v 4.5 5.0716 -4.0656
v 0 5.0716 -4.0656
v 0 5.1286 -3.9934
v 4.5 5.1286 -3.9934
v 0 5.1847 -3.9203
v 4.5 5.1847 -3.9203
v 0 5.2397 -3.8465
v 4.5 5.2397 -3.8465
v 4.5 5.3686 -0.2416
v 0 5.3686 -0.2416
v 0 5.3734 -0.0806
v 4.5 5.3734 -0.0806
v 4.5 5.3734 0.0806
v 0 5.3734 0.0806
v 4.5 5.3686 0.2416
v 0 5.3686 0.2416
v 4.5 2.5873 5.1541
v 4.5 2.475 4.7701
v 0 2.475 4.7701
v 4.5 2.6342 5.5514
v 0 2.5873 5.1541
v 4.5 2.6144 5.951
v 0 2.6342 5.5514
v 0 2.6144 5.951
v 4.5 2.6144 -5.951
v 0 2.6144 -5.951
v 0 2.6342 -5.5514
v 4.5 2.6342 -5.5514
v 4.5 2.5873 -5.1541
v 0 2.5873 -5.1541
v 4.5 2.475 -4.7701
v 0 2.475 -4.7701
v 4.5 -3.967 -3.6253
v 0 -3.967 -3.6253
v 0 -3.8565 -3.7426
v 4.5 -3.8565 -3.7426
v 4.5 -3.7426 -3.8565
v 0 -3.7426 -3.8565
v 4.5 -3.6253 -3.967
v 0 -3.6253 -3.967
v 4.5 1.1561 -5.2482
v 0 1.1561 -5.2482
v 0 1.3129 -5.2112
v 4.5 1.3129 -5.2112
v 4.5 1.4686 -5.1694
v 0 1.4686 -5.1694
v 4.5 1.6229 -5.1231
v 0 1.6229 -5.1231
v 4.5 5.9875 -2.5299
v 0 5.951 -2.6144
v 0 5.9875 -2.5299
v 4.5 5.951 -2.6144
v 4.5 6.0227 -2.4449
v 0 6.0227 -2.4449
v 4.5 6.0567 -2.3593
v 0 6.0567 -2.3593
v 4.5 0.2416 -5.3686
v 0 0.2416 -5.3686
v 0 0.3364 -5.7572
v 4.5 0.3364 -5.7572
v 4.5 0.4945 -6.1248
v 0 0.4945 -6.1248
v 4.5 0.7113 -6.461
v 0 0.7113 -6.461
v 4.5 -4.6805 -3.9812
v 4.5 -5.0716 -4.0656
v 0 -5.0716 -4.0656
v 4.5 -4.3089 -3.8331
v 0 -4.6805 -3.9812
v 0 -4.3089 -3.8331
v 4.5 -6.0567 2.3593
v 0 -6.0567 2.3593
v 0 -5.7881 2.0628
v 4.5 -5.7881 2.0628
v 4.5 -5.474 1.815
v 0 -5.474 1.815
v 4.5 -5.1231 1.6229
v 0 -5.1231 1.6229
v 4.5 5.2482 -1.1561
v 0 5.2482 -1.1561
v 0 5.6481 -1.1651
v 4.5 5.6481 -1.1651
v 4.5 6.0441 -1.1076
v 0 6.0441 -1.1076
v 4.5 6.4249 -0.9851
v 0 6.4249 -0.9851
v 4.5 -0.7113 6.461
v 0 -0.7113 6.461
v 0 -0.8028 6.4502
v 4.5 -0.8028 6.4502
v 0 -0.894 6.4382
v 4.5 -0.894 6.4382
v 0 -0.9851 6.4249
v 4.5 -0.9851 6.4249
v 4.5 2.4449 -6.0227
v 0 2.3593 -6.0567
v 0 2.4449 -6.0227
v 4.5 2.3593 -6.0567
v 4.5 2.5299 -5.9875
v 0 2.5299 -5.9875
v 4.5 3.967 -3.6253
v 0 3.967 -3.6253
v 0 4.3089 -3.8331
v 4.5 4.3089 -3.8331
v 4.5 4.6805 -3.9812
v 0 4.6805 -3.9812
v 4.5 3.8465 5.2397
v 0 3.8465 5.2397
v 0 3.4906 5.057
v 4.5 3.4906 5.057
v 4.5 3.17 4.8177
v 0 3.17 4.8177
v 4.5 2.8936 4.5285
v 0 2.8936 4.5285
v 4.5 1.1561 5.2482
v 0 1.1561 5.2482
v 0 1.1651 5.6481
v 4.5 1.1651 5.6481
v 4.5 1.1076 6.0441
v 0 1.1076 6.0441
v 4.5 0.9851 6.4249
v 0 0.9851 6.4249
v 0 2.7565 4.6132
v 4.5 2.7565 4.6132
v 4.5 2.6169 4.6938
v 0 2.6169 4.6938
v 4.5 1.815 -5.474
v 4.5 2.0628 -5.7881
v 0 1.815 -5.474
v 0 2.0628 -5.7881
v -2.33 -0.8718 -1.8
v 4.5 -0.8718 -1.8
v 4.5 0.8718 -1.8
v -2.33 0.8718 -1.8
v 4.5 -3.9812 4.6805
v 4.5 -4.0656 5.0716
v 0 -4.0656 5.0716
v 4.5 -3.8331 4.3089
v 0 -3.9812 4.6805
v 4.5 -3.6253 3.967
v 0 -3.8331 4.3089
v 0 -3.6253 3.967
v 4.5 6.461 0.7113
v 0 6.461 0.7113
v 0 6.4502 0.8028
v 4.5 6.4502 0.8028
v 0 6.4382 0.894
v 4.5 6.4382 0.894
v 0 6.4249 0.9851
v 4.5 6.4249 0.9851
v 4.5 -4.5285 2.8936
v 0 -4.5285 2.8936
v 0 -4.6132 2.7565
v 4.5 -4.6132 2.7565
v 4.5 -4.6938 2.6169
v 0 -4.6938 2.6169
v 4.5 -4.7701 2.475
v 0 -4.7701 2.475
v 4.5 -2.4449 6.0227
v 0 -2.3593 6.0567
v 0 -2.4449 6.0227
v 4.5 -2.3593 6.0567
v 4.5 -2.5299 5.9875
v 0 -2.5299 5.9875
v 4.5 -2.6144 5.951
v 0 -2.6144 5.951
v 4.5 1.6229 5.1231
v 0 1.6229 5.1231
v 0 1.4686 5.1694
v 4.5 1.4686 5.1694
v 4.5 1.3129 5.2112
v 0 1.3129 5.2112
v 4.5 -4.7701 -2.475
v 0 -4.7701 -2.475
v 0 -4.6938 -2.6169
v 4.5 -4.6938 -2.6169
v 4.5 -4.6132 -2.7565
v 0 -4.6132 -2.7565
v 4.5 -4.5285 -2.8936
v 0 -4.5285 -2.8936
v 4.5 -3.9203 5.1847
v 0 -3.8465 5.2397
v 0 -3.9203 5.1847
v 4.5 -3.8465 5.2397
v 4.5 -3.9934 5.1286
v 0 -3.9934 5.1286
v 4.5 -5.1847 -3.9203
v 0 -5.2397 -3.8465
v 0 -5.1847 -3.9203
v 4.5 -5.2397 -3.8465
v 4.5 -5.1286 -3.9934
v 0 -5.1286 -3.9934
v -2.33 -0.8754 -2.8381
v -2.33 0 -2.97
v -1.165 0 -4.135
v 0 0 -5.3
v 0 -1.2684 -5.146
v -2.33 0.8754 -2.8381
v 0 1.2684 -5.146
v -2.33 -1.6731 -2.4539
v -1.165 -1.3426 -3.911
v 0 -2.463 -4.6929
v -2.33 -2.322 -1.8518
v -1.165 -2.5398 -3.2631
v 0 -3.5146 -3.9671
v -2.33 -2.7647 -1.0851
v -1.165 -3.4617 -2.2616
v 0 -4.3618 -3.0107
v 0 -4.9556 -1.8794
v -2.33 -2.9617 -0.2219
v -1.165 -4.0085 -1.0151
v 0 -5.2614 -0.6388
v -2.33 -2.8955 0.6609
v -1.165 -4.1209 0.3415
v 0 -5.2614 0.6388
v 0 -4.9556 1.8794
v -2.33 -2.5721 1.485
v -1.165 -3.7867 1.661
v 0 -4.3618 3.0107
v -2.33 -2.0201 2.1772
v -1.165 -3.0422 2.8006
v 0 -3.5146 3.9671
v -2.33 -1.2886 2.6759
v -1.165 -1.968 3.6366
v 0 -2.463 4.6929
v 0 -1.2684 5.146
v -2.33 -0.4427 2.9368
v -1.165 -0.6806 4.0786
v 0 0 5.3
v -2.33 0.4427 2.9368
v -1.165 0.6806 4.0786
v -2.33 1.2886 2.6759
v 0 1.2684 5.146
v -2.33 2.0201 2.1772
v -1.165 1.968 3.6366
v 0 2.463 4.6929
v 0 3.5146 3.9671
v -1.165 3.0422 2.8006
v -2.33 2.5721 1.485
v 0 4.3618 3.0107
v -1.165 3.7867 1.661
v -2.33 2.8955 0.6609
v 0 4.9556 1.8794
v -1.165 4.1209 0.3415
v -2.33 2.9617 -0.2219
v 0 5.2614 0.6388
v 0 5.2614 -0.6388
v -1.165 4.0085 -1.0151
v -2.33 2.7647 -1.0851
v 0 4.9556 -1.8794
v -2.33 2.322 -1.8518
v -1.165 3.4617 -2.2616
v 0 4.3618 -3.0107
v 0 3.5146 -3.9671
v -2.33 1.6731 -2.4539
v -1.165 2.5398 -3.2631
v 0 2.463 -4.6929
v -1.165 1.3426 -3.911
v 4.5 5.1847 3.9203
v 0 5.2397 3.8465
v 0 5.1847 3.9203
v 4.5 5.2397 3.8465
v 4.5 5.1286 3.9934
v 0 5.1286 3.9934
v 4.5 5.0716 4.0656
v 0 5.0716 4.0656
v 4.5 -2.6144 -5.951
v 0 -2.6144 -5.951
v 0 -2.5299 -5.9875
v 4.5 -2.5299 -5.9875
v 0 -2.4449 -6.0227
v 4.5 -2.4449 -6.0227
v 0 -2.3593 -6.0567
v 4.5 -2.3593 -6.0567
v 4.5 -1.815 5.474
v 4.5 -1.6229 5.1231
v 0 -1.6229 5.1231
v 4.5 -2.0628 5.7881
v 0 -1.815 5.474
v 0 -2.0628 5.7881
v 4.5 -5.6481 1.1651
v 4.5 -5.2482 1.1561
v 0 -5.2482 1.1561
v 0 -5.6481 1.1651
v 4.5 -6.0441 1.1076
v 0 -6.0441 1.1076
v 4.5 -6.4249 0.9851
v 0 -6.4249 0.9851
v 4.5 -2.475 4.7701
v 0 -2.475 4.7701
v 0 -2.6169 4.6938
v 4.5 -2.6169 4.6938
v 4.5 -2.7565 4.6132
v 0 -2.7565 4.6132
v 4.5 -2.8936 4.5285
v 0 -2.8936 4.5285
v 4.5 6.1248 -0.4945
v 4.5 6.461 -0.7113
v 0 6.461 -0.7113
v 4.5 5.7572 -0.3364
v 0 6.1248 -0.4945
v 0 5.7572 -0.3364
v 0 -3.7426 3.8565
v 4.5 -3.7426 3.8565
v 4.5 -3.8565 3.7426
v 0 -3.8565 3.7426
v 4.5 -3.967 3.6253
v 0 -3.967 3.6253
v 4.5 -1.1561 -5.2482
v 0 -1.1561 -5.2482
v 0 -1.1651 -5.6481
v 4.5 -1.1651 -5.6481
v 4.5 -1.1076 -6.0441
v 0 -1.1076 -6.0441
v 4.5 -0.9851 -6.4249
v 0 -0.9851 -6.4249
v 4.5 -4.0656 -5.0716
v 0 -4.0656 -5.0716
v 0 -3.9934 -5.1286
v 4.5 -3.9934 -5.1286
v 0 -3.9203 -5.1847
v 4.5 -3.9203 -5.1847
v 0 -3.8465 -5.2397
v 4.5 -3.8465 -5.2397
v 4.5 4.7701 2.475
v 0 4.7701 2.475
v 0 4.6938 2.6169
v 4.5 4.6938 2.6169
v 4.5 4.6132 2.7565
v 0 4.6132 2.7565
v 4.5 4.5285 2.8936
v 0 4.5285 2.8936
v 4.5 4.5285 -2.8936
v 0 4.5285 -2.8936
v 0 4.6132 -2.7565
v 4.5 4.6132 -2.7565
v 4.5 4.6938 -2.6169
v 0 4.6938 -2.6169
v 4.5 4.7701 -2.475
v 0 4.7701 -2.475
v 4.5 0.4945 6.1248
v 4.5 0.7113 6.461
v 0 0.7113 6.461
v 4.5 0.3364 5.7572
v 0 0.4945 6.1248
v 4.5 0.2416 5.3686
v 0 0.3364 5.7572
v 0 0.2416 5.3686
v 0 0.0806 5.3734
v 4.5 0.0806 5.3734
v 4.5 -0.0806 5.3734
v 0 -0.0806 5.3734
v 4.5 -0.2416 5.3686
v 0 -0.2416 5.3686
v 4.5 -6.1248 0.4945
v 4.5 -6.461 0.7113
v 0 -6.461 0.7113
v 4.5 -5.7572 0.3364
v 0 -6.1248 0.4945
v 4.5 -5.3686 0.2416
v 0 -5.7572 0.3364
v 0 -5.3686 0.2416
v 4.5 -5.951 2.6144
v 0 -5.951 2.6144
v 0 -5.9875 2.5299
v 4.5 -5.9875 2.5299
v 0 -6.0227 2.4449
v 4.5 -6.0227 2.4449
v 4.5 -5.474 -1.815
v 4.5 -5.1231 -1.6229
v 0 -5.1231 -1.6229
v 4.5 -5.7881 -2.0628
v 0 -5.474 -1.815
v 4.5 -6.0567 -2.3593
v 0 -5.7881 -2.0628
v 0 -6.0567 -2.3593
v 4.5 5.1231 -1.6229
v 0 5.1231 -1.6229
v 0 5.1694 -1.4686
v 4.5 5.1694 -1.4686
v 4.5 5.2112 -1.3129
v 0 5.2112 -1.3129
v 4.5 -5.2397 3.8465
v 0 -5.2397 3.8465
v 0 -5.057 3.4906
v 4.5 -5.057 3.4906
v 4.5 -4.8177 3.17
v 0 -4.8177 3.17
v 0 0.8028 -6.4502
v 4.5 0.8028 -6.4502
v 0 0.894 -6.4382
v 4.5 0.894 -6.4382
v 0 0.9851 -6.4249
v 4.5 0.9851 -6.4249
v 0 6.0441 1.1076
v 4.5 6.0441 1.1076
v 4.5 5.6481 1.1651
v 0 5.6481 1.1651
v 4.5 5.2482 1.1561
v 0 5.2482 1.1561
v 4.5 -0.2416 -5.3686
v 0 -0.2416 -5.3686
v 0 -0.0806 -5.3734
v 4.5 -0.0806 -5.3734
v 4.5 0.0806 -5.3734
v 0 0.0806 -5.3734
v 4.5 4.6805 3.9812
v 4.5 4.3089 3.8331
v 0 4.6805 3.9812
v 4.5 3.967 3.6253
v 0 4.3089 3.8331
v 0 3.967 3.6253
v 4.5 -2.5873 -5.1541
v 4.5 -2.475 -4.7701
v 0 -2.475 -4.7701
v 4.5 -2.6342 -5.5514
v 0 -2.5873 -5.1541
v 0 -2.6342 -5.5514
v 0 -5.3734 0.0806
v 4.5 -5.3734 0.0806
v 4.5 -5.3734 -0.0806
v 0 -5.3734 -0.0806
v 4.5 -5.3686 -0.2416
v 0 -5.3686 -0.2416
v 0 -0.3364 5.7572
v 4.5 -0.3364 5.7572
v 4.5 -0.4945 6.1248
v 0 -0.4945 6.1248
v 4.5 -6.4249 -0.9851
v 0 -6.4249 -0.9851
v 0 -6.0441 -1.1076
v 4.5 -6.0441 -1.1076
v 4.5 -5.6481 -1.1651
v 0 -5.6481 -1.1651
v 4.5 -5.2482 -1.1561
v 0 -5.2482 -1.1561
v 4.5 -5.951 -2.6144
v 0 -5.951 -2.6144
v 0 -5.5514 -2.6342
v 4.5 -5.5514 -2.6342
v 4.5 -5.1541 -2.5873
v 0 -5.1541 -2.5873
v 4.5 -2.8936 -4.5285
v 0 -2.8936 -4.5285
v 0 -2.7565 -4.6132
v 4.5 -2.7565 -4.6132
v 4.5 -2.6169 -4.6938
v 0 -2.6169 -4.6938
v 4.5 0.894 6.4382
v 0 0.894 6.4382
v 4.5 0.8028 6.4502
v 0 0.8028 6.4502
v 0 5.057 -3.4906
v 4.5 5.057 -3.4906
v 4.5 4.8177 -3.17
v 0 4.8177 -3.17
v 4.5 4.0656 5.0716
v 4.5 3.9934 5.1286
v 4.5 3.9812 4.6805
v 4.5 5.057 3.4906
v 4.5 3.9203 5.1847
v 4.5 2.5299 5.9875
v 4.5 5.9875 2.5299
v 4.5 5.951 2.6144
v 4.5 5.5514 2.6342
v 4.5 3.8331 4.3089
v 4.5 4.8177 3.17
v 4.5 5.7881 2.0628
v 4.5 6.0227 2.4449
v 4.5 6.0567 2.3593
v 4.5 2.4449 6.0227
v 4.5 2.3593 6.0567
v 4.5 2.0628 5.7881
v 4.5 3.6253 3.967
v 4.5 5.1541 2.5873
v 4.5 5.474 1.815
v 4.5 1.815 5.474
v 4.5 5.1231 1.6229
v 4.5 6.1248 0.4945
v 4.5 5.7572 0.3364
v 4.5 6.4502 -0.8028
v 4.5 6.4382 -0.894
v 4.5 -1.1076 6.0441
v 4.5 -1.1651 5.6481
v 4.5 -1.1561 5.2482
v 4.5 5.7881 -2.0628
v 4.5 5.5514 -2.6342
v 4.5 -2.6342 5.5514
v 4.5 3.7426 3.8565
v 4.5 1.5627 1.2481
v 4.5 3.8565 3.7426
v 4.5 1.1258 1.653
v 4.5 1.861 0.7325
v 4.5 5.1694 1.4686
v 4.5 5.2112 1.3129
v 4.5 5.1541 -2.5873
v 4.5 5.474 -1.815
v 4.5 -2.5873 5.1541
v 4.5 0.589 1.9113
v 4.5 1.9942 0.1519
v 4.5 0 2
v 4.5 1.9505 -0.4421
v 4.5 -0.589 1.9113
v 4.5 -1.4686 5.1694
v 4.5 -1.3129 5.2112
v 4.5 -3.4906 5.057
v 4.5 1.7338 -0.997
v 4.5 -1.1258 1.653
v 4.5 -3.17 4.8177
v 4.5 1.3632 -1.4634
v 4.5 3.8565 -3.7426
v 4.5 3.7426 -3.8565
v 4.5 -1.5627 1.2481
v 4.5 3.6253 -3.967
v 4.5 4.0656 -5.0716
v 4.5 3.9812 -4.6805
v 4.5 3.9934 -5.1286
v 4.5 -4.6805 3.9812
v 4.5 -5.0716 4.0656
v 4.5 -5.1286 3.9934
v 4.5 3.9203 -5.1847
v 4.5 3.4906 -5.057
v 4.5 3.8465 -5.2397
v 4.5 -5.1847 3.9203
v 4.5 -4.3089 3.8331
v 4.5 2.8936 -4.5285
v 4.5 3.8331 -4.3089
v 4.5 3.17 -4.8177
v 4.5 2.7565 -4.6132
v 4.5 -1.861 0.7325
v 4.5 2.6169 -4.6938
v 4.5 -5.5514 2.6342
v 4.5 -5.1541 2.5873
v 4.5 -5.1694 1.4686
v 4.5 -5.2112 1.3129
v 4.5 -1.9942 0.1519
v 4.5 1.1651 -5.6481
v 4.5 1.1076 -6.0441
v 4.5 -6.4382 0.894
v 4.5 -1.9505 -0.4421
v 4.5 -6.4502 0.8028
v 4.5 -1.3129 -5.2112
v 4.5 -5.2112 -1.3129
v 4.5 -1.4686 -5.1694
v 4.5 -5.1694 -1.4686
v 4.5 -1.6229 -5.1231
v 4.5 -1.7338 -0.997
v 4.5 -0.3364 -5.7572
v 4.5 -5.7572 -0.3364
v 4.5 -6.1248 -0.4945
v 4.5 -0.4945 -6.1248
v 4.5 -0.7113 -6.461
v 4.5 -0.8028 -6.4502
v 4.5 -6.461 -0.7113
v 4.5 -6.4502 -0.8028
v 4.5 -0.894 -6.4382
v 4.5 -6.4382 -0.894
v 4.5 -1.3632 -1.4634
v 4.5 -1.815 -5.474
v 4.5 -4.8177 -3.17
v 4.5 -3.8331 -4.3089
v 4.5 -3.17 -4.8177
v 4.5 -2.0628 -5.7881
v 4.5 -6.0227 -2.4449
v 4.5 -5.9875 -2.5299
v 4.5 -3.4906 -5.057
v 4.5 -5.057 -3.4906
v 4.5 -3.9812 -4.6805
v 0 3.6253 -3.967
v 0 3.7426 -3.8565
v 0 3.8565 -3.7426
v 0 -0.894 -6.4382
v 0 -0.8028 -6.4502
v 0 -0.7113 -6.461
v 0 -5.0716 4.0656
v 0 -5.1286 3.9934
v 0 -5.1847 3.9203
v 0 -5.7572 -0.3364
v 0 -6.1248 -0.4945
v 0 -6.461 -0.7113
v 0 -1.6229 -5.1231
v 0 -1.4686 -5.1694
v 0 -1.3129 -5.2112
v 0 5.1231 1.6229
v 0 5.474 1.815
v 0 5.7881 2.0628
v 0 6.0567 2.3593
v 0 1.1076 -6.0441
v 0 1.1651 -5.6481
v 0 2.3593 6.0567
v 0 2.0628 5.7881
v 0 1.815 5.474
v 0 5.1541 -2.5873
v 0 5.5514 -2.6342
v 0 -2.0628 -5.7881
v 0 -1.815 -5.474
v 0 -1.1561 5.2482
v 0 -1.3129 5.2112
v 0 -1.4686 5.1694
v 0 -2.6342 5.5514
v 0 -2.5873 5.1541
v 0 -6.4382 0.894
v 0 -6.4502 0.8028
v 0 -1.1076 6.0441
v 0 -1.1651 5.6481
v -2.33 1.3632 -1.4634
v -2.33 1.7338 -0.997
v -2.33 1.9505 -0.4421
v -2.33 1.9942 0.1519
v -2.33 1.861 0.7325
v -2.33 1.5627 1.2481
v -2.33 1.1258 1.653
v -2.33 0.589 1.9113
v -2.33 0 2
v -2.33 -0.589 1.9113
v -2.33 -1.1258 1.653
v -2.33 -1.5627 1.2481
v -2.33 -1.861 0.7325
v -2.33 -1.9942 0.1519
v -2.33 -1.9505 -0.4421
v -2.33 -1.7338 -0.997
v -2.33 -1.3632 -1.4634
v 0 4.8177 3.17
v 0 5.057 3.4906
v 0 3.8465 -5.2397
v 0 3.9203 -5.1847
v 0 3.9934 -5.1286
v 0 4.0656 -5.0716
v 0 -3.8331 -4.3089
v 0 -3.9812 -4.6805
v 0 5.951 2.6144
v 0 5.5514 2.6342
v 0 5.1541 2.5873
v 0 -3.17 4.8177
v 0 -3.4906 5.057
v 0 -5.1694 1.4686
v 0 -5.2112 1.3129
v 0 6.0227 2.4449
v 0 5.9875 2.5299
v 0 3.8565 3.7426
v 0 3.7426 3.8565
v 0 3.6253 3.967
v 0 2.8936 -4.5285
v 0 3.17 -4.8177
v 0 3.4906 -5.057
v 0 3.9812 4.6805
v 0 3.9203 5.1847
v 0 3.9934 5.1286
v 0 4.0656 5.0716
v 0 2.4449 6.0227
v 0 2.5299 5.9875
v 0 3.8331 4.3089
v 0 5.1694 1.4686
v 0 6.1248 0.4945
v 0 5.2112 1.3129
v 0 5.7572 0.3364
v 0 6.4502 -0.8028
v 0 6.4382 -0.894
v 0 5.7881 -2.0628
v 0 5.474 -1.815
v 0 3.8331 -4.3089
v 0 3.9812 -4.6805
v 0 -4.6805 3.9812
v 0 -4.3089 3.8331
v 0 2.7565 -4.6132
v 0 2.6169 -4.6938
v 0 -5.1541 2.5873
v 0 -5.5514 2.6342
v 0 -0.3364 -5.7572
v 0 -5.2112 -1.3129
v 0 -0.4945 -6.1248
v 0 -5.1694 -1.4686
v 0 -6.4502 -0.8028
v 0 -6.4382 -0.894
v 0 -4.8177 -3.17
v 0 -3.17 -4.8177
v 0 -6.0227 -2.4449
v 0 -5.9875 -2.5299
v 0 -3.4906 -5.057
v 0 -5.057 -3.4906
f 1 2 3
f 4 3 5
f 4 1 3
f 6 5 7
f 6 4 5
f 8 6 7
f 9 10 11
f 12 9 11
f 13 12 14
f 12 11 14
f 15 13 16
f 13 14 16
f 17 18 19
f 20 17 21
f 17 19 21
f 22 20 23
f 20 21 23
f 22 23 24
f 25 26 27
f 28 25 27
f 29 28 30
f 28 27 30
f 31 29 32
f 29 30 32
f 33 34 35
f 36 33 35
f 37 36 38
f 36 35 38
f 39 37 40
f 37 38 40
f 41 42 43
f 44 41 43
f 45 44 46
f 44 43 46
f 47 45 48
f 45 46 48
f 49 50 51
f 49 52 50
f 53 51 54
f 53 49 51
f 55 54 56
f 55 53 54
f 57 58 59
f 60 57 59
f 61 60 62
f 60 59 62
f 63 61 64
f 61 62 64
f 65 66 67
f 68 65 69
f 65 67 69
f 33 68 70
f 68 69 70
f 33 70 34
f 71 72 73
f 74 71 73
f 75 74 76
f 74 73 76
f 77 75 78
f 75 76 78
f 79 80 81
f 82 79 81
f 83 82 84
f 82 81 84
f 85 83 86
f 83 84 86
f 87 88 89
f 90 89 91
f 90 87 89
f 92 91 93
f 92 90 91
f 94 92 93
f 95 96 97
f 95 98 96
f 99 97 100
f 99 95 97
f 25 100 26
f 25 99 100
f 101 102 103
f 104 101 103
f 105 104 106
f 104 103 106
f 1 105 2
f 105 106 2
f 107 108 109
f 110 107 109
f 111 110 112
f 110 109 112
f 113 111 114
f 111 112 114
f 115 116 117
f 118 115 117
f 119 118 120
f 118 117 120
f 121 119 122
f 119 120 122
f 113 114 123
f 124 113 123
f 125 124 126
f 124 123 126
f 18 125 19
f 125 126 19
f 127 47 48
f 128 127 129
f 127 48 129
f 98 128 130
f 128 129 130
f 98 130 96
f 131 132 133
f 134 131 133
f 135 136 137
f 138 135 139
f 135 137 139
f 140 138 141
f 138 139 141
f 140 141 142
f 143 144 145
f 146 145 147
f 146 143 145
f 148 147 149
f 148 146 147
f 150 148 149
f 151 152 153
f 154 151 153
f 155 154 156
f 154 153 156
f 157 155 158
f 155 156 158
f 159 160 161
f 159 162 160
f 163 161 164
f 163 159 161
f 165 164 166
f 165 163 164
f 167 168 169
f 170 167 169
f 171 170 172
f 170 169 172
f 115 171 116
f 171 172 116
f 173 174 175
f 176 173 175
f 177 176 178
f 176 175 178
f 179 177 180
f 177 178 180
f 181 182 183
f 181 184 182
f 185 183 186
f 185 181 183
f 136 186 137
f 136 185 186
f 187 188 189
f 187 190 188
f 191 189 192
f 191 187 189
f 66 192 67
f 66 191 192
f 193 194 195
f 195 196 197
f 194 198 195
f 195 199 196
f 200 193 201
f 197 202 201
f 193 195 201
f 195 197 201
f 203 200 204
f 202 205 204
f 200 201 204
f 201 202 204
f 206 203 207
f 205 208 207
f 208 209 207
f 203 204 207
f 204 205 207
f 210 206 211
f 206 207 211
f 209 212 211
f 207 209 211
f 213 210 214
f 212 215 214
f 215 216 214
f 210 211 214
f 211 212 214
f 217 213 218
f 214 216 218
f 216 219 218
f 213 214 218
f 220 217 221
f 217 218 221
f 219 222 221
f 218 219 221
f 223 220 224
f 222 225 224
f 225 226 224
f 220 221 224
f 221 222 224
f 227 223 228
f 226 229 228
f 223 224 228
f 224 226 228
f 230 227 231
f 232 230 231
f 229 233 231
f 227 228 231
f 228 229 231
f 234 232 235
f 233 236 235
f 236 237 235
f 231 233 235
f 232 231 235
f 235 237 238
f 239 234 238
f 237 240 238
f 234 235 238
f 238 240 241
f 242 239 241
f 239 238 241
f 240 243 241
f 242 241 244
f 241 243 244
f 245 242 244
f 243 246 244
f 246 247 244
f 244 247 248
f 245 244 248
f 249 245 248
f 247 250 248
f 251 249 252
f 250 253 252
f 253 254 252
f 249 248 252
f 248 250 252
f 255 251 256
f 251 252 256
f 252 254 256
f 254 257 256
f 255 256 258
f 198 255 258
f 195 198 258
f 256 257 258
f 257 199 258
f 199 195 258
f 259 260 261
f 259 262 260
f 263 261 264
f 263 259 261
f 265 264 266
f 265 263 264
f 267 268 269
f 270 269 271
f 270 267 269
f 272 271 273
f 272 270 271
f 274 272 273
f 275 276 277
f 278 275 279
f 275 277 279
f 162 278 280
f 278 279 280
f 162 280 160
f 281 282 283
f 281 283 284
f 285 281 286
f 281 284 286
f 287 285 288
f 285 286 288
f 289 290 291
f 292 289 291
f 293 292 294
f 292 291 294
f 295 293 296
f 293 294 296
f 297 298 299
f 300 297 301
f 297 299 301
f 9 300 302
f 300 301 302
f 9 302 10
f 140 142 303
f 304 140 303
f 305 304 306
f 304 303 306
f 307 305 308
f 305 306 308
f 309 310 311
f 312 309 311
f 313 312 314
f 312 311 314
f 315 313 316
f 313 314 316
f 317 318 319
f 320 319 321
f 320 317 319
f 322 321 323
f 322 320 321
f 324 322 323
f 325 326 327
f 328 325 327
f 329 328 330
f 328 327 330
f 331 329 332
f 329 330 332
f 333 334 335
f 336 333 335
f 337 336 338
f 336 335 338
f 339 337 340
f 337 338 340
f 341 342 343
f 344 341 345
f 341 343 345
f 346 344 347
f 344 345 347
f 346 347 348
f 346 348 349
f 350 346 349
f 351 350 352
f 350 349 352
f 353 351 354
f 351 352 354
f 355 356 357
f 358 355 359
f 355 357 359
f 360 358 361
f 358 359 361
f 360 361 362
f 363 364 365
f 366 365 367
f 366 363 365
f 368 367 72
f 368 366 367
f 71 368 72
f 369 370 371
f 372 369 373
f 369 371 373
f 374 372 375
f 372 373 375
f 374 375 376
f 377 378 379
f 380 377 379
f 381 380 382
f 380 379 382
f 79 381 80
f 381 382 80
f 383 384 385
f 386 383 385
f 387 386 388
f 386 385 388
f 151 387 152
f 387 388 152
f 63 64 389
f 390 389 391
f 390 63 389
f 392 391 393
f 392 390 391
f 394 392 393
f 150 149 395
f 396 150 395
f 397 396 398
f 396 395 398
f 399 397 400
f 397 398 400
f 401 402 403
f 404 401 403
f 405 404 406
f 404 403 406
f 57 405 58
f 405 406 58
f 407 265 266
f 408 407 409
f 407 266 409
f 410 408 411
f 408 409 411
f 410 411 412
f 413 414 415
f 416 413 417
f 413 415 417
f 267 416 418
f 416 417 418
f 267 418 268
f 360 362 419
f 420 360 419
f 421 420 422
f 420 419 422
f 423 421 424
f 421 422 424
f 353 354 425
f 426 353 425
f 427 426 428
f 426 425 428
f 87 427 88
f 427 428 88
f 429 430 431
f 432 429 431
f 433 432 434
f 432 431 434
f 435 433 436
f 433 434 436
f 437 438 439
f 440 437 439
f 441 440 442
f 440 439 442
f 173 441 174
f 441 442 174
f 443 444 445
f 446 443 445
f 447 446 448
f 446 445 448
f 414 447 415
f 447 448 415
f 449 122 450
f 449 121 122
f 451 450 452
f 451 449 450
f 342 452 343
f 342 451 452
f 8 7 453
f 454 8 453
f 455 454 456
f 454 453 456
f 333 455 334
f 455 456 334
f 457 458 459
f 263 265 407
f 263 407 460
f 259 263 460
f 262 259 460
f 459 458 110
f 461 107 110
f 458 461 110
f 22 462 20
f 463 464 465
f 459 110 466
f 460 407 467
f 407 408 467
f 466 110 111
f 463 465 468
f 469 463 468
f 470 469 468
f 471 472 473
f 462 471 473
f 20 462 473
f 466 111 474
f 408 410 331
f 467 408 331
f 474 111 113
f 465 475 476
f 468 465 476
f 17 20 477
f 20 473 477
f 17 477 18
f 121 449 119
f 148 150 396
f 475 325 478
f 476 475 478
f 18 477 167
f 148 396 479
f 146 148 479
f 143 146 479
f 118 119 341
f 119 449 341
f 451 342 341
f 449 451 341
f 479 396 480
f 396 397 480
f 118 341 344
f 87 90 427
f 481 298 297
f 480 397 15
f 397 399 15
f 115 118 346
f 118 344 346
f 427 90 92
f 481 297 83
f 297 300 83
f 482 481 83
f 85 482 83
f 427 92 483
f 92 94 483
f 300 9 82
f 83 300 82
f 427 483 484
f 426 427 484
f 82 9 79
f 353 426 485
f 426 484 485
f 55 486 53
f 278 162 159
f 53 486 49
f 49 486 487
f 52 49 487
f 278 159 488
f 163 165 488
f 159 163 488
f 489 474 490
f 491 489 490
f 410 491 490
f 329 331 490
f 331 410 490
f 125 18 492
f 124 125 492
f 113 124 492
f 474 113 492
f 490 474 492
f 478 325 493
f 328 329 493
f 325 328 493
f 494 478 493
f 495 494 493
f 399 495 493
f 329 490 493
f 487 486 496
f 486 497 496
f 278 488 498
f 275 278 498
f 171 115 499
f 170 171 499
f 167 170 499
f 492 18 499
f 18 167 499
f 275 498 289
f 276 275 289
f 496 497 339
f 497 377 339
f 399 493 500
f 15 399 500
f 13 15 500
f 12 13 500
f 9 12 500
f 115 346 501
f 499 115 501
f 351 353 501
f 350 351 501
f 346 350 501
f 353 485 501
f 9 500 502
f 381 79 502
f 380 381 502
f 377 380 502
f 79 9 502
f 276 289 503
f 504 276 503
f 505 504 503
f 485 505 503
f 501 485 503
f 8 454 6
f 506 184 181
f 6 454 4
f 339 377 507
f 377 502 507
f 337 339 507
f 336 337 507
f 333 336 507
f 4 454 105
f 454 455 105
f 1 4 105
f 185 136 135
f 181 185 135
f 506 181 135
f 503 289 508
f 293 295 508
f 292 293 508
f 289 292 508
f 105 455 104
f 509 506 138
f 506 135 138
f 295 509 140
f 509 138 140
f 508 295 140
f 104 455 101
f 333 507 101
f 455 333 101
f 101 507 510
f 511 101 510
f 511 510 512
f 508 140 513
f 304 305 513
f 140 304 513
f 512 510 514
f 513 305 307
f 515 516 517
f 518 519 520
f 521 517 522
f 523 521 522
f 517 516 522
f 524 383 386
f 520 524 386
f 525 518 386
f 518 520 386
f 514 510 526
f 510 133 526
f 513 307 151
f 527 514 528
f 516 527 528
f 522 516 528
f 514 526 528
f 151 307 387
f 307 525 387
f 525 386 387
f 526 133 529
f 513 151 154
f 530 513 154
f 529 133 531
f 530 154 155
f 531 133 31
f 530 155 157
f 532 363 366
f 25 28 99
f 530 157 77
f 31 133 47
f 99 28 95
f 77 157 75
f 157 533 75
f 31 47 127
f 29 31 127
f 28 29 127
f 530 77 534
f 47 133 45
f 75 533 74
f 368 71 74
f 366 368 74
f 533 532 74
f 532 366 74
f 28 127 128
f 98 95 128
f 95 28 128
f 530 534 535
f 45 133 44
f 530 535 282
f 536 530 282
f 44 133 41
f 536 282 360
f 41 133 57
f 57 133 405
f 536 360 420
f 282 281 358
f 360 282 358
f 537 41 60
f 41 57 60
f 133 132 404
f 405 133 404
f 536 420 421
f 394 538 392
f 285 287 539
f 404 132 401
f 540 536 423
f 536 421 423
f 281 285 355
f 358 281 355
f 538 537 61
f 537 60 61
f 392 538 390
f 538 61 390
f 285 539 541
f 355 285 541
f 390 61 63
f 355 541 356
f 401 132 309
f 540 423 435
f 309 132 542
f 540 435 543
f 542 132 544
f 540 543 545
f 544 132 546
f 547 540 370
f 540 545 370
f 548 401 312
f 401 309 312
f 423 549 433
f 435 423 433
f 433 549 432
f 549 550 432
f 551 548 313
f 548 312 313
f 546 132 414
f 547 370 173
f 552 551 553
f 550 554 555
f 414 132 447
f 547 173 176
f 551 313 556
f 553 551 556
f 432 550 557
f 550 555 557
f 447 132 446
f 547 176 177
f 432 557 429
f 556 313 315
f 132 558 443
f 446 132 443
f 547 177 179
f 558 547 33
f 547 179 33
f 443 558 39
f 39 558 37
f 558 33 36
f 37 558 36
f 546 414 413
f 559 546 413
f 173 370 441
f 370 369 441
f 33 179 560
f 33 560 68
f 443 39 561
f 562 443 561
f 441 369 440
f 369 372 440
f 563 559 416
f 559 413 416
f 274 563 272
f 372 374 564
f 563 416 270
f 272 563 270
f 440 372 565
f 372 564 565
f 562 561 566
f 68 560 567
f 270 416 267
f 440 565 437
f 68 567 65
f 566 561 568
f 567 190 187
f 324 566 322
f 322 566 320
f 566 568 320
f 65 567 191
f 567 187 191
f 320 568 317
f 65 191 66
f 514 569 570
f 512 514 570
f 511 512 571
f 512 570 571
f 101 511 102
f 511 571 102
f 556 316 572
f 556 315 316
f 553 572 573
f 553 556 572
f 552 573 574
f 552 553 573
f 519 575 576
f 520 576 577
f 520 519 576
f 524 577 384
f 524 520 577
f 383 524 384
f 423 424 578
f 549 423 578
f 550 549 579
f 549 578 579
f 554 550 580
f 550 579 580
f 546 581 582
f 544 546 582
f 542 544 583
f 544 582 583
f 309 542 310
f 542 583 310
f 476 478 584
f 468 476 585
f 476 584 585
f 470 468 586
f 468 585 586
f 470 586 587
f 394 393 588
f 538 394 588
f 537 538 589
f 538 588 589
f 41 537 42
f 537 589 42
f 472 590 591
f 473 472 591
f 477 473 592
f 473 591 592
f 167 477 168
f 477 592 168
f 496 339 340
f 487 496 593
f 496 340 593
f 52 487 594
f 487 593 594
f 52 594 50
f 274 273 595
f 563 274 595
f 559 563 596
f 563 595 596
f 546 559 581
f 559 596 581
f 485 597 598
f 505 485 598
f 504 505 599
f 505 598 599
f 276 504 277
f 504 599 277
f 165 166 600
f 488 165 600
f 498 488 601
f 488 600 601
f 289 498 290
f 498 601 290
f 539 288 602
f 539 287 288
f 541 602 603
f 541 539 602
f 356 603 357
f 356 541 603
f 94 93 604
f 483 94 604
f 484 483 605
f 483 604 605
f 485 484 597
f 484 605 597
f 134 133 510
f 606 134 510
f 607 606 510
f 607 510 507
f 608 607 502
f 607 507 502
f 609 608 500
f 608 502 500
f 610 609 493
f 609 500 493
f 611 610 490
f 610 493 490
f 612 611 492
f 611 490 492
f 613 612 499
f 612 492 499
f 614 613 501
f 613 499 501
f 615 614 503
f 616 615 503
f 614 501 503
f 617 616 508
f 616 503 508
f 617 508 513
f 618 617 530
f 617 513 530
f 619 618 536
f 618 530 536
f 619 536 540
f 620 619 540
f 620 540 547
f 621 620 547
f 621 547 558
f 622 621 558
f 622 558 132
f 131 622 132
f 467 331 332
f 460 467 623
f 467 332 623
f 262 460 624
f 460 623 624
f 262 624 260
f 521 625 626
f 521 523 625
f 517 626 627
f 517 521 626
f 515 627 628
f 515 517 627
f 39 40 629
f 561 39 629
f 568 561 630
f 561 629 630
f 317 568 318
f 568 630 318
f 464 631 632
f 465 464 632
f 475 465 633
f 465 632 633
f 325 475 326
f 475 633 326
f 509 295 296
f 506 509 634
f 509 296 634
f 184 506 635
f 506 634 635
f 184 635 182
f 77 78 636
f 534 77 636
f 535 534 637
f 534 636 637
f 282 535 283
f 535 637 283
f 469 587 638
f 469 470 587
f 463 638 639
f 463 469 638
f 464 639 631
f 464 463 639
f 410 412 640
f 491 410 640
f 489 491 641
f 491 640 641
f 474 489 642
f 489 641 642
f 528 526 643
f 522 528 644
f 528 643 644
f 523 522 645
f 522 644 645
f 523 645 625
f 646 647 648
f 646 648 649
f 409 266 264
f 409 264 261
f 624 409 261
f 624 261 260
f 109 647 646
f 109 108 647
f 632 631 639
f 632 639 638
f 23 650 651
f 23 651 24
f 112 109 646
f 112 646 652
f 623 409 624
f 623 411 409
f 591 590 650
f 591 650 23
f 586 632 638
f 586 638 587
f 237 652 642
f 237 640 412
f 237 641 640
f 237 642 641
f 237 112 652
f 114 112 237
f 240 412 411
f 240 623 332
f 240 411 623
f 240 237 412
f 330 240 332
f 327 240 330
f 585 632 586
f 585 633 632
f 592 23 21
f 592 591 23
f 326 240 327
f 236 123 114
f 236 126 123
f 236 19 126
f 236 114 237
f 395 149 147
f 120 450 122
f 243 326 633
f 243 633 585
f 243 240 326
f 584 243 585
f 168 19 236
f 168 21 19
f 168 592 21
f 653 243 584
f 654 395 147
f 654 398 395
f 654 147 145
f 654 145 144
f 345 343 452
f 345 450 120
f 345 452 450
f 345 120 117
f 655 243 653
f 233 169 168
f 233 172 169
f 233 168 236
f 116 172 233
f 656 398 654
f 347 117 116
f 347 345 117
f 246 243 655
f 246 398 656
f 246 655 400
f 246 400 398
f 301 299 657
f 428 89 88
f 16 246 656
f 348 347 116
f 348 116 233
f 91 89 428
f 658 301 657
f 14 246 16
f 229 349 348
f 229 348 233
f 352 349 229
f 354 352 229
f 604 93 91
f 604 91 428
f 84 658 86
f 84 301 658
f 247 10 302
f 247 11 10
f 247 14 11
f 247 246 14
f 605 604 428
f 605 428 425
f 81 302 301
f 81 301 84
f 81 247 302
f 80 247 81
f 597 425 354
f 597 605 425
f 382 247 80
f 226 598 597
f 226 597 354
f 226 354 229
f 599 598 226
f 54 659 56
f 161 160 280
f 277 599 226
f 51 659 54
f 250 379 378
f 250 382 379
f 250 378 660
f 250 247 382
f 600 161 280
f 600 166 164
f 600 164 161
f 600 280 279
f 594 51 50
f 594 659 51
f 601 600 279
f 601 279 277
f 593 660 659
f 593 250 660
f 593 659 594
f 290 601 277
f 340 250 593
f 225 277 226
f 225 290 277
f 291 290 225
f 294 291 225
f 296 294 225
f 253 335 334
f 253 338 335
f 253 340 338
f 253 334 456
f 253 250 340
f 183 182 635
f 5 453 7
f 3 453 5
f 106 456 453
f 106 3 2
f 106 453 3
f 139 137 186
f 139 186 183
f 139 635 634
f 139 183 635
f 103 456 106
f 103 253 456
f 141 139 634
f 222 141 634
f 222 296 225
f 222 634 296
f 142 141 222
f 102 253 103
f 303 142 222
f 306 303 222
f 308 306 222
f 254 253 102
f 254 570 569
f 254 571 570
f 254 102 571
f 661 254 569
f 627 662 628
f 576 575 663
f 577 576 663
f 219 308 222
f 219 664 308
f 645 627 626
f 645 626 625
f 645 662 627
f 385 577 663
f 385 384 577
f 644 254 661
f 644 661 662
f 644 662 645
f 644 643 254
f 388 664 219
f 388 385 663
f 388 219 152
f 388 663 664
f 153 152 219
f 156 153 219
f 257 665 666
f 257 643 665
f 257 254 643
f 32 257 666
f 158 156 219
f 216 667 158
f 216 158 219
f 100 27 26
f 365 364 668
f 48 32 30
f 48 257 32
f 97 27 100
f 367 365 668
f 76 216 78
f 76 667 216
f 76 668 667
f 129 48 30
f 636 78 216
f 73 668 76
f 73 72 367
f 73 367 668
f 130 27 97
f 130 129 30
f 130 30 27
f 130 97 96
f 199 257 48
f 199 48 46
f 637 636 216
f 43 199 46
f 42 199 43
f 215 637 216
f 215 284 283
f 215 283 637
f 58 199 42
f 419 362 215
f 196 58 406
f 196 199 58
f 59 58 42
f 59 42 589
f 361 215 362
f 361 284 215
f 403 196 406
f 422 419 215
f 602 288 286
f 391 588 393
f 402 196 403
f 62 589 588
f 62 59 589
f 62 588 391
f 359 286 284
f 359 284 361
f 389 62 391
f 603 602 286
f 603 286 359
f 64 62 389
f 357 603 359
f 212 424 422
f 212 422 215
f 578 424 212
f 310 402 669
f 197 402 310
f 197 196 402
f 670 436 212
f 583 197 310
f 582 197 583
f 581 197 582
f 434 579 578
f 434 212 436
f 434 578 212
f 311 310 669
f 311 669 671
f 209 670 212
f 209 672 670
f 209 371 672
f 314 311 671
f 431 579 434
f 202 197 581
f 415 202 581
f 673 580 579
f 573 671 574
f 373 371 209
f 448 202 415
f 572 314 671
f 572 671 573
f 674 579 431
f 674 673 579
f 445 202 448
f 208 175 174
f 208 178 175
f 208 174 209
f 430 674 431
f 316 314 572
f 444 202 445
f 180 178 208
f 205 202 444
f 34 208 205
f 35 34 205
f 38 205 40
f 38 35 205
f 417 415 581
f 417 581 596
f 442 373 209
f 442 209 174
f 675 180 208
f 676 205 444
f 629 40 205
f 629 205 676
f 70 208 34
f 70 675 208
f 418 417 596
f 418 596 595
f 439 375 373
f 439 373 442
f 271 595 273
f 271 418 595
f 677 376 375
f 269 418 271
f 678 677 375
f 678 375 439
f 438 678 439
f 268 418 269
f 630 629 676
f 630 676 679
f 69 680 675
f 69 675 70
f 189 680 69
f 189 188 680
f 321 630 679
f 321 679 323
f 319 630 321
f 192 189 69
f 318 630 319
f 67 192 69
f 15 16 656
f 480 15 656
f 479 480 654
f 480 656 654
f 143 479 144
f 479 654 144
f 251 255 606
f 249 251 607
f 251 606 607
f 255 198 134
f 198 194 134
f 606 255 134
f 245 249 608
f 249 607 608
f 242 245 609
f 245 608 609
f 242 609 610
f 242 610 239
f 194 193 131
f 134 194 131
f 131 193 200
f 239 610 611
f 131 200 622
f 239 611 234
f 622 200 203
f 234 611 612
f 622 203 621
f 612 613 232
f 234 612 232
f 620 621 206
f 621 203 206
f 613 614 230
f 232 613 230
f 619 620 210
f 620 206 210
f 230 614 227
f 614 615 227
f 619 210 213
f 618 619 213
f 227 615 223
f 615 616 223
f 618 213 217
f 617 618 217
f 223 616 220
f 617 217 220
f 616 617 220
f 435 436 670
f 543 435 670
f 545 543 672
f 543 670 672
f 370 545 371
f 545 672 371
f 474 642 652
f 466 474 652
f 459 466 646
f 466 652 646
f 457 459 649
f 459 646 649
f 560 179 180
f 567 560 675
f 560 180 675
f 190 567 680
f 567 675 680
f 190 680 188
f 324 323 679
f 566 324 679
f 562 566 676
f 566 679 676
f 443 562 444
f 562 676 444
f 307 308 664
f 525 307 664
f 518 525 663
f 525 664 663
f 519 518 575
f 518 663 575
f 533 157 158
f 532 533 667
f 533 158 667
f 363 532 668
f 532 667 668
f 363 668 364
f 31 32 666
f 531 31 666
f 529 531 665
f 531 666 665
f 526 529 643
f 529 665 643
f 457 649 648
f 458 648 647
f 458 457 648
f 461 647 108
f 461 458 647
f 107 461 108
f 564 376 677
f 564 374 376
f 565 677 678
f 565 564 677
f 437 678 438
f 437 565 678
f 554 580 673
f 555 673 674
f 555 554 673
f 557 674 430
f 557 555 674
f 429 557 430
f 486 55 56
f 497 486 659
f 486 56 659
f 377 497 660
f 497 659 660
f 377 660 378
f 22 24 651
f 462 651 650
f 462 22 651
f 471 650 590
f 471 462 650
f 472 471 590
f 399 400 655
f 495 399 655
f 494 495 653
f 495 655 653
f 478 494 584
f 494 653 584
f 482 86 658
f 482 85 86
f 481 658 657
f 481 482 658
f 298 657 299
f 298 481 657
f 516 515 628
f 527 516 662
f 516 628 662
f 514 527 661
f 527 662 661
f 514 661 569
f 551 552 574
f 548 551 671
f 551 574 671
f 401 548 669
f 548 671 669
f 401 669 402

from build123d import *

# Parameters (mm, degrees)
BASPROSKE_W         = 4.5
BASPROSKE_H         = 6.5
TOOTHCUT_DEPTH      = 11.234744745
TEETHCUTS_COUNT     = 24
TEETHCUTS_ANGLE     = 345
BORSKE_R            = 1.5
BORE_DEPTH          = 50.0000508
CUT_EXTRUDE_1_REACH = 13.408


with BuildPart() as part:
    # BasProSke → Base-Revolve (revolve)
    with BuildSketch(Plane(origin=(0, 0, 0), x_dir=(1, 0, 0), z_dir=(0, 1, 0)), mode=Mode.PRIVATE) as base_revolve_sk:
        with Locations((2.25, 3.25)):
            Rectangle(BASPROSKE_W, BASPROSKE_H)
    revolve(base_revolve_sk.sketch.rotate(Axis((-10, 0, 0), (1, 0, 0)), 180), axis=Axis((-10, 0, 0), (1, 0, 0)))

    # TooCutSke → ToothCut (cut, through all)
    with BuildSketch(Plane(origin=(0, 0, 0), x_dir=(0, 0, -1), z_dir=(1, 0, 0))):
        with BuildLine():
            ThreePointArc((0.241646108, 5.368564348), (0, 5.374), (-0.241646108, 5.368564348))
            ThreePointArc((-0.241646108, 5.368564348), (-0.413699957, 5.957993365), (-0.729686037, 6.48447403))
            ThreePointArc((-0.729686037, 6.48447403), (0, 6.5254), (0.729686037, 6.48447403))
            ThreePointArc((0.729686037, 6.48447403), (0.413699957, 5.957993365), (0.241646108, 5.368564348))
        make_face()
    toothcut = extrude(amount=TOOTHCUT_DEPTH, mode=Mode.SUBTRACT)

    # TeethCuts: ToothCut ×24 about axis
    teethcuts_axis = Axis((-10, 0, 0), (1, 0, 0))
    for i in range(1, TEETHCUTS_COUNT):
        add(toothcut.rotate(teethcuts_axis, i * TEETHCUTS_ANGLE / (TEETHCUTS_COUNT - 1)), mode=Mode.SUBTRACT)

    # BorSke → Bore (cut, symmetric)
    with BuildSketch(Plane(origin=(0, 0, 0), x_dir=(0, 0, -1), z_dir=(1, 0, 0))):
        with Locations(Location((0, 0, 0), (0, 0, 180))):
            Circle(BORSKE_R)
    extrude(amount=BORE_DEPTH, both=True, mode=Mode.SUBTRACT)

    # 草图1 → 旋转1 (revolve)
    with BuildSketch(Plane(origin=(0, 0, 0), x_dir=(1, 0, 0), z_dir=(0, 1, 0))):
        Polygon((0, 0), (-2.33, 0), (-2.33, 2.97), (0, 5.3), align=None)
    revolve(axis=Axis((0, 0, 0), (-1, 0, 0)))

    # 草图2 → 切除-拉伸1 (cut, up to next)
    with BuildSketch(Plane(origin=(4.5, 0, 0), x_dir=(0, 0, -1), z_dir=(1, 0, 0)), mode=Mode.PRIVATE) as cut_extrude_1_sk1:
        with BuildLine():
            Line((1.8, -0.871779789), (1.8, 0.871779789))
            ThreePointArc((1.8, 0.871779789), (-2, 0), (1.8, -0.871779789))
        make_face()
    cut_extrude_1_tool1 = extrude(cut_extrude_1_sk1.sketch, amount=-CUT_EXTRUDE_1_REACH, mode=Mode.PRIVATE) & part.part
    add(cut_extrude_1_tool1.solids().sort_by_distance((4.5, 0, 0.035819))[0], mode=Mode.SUBTRACT)


solid = part.part
